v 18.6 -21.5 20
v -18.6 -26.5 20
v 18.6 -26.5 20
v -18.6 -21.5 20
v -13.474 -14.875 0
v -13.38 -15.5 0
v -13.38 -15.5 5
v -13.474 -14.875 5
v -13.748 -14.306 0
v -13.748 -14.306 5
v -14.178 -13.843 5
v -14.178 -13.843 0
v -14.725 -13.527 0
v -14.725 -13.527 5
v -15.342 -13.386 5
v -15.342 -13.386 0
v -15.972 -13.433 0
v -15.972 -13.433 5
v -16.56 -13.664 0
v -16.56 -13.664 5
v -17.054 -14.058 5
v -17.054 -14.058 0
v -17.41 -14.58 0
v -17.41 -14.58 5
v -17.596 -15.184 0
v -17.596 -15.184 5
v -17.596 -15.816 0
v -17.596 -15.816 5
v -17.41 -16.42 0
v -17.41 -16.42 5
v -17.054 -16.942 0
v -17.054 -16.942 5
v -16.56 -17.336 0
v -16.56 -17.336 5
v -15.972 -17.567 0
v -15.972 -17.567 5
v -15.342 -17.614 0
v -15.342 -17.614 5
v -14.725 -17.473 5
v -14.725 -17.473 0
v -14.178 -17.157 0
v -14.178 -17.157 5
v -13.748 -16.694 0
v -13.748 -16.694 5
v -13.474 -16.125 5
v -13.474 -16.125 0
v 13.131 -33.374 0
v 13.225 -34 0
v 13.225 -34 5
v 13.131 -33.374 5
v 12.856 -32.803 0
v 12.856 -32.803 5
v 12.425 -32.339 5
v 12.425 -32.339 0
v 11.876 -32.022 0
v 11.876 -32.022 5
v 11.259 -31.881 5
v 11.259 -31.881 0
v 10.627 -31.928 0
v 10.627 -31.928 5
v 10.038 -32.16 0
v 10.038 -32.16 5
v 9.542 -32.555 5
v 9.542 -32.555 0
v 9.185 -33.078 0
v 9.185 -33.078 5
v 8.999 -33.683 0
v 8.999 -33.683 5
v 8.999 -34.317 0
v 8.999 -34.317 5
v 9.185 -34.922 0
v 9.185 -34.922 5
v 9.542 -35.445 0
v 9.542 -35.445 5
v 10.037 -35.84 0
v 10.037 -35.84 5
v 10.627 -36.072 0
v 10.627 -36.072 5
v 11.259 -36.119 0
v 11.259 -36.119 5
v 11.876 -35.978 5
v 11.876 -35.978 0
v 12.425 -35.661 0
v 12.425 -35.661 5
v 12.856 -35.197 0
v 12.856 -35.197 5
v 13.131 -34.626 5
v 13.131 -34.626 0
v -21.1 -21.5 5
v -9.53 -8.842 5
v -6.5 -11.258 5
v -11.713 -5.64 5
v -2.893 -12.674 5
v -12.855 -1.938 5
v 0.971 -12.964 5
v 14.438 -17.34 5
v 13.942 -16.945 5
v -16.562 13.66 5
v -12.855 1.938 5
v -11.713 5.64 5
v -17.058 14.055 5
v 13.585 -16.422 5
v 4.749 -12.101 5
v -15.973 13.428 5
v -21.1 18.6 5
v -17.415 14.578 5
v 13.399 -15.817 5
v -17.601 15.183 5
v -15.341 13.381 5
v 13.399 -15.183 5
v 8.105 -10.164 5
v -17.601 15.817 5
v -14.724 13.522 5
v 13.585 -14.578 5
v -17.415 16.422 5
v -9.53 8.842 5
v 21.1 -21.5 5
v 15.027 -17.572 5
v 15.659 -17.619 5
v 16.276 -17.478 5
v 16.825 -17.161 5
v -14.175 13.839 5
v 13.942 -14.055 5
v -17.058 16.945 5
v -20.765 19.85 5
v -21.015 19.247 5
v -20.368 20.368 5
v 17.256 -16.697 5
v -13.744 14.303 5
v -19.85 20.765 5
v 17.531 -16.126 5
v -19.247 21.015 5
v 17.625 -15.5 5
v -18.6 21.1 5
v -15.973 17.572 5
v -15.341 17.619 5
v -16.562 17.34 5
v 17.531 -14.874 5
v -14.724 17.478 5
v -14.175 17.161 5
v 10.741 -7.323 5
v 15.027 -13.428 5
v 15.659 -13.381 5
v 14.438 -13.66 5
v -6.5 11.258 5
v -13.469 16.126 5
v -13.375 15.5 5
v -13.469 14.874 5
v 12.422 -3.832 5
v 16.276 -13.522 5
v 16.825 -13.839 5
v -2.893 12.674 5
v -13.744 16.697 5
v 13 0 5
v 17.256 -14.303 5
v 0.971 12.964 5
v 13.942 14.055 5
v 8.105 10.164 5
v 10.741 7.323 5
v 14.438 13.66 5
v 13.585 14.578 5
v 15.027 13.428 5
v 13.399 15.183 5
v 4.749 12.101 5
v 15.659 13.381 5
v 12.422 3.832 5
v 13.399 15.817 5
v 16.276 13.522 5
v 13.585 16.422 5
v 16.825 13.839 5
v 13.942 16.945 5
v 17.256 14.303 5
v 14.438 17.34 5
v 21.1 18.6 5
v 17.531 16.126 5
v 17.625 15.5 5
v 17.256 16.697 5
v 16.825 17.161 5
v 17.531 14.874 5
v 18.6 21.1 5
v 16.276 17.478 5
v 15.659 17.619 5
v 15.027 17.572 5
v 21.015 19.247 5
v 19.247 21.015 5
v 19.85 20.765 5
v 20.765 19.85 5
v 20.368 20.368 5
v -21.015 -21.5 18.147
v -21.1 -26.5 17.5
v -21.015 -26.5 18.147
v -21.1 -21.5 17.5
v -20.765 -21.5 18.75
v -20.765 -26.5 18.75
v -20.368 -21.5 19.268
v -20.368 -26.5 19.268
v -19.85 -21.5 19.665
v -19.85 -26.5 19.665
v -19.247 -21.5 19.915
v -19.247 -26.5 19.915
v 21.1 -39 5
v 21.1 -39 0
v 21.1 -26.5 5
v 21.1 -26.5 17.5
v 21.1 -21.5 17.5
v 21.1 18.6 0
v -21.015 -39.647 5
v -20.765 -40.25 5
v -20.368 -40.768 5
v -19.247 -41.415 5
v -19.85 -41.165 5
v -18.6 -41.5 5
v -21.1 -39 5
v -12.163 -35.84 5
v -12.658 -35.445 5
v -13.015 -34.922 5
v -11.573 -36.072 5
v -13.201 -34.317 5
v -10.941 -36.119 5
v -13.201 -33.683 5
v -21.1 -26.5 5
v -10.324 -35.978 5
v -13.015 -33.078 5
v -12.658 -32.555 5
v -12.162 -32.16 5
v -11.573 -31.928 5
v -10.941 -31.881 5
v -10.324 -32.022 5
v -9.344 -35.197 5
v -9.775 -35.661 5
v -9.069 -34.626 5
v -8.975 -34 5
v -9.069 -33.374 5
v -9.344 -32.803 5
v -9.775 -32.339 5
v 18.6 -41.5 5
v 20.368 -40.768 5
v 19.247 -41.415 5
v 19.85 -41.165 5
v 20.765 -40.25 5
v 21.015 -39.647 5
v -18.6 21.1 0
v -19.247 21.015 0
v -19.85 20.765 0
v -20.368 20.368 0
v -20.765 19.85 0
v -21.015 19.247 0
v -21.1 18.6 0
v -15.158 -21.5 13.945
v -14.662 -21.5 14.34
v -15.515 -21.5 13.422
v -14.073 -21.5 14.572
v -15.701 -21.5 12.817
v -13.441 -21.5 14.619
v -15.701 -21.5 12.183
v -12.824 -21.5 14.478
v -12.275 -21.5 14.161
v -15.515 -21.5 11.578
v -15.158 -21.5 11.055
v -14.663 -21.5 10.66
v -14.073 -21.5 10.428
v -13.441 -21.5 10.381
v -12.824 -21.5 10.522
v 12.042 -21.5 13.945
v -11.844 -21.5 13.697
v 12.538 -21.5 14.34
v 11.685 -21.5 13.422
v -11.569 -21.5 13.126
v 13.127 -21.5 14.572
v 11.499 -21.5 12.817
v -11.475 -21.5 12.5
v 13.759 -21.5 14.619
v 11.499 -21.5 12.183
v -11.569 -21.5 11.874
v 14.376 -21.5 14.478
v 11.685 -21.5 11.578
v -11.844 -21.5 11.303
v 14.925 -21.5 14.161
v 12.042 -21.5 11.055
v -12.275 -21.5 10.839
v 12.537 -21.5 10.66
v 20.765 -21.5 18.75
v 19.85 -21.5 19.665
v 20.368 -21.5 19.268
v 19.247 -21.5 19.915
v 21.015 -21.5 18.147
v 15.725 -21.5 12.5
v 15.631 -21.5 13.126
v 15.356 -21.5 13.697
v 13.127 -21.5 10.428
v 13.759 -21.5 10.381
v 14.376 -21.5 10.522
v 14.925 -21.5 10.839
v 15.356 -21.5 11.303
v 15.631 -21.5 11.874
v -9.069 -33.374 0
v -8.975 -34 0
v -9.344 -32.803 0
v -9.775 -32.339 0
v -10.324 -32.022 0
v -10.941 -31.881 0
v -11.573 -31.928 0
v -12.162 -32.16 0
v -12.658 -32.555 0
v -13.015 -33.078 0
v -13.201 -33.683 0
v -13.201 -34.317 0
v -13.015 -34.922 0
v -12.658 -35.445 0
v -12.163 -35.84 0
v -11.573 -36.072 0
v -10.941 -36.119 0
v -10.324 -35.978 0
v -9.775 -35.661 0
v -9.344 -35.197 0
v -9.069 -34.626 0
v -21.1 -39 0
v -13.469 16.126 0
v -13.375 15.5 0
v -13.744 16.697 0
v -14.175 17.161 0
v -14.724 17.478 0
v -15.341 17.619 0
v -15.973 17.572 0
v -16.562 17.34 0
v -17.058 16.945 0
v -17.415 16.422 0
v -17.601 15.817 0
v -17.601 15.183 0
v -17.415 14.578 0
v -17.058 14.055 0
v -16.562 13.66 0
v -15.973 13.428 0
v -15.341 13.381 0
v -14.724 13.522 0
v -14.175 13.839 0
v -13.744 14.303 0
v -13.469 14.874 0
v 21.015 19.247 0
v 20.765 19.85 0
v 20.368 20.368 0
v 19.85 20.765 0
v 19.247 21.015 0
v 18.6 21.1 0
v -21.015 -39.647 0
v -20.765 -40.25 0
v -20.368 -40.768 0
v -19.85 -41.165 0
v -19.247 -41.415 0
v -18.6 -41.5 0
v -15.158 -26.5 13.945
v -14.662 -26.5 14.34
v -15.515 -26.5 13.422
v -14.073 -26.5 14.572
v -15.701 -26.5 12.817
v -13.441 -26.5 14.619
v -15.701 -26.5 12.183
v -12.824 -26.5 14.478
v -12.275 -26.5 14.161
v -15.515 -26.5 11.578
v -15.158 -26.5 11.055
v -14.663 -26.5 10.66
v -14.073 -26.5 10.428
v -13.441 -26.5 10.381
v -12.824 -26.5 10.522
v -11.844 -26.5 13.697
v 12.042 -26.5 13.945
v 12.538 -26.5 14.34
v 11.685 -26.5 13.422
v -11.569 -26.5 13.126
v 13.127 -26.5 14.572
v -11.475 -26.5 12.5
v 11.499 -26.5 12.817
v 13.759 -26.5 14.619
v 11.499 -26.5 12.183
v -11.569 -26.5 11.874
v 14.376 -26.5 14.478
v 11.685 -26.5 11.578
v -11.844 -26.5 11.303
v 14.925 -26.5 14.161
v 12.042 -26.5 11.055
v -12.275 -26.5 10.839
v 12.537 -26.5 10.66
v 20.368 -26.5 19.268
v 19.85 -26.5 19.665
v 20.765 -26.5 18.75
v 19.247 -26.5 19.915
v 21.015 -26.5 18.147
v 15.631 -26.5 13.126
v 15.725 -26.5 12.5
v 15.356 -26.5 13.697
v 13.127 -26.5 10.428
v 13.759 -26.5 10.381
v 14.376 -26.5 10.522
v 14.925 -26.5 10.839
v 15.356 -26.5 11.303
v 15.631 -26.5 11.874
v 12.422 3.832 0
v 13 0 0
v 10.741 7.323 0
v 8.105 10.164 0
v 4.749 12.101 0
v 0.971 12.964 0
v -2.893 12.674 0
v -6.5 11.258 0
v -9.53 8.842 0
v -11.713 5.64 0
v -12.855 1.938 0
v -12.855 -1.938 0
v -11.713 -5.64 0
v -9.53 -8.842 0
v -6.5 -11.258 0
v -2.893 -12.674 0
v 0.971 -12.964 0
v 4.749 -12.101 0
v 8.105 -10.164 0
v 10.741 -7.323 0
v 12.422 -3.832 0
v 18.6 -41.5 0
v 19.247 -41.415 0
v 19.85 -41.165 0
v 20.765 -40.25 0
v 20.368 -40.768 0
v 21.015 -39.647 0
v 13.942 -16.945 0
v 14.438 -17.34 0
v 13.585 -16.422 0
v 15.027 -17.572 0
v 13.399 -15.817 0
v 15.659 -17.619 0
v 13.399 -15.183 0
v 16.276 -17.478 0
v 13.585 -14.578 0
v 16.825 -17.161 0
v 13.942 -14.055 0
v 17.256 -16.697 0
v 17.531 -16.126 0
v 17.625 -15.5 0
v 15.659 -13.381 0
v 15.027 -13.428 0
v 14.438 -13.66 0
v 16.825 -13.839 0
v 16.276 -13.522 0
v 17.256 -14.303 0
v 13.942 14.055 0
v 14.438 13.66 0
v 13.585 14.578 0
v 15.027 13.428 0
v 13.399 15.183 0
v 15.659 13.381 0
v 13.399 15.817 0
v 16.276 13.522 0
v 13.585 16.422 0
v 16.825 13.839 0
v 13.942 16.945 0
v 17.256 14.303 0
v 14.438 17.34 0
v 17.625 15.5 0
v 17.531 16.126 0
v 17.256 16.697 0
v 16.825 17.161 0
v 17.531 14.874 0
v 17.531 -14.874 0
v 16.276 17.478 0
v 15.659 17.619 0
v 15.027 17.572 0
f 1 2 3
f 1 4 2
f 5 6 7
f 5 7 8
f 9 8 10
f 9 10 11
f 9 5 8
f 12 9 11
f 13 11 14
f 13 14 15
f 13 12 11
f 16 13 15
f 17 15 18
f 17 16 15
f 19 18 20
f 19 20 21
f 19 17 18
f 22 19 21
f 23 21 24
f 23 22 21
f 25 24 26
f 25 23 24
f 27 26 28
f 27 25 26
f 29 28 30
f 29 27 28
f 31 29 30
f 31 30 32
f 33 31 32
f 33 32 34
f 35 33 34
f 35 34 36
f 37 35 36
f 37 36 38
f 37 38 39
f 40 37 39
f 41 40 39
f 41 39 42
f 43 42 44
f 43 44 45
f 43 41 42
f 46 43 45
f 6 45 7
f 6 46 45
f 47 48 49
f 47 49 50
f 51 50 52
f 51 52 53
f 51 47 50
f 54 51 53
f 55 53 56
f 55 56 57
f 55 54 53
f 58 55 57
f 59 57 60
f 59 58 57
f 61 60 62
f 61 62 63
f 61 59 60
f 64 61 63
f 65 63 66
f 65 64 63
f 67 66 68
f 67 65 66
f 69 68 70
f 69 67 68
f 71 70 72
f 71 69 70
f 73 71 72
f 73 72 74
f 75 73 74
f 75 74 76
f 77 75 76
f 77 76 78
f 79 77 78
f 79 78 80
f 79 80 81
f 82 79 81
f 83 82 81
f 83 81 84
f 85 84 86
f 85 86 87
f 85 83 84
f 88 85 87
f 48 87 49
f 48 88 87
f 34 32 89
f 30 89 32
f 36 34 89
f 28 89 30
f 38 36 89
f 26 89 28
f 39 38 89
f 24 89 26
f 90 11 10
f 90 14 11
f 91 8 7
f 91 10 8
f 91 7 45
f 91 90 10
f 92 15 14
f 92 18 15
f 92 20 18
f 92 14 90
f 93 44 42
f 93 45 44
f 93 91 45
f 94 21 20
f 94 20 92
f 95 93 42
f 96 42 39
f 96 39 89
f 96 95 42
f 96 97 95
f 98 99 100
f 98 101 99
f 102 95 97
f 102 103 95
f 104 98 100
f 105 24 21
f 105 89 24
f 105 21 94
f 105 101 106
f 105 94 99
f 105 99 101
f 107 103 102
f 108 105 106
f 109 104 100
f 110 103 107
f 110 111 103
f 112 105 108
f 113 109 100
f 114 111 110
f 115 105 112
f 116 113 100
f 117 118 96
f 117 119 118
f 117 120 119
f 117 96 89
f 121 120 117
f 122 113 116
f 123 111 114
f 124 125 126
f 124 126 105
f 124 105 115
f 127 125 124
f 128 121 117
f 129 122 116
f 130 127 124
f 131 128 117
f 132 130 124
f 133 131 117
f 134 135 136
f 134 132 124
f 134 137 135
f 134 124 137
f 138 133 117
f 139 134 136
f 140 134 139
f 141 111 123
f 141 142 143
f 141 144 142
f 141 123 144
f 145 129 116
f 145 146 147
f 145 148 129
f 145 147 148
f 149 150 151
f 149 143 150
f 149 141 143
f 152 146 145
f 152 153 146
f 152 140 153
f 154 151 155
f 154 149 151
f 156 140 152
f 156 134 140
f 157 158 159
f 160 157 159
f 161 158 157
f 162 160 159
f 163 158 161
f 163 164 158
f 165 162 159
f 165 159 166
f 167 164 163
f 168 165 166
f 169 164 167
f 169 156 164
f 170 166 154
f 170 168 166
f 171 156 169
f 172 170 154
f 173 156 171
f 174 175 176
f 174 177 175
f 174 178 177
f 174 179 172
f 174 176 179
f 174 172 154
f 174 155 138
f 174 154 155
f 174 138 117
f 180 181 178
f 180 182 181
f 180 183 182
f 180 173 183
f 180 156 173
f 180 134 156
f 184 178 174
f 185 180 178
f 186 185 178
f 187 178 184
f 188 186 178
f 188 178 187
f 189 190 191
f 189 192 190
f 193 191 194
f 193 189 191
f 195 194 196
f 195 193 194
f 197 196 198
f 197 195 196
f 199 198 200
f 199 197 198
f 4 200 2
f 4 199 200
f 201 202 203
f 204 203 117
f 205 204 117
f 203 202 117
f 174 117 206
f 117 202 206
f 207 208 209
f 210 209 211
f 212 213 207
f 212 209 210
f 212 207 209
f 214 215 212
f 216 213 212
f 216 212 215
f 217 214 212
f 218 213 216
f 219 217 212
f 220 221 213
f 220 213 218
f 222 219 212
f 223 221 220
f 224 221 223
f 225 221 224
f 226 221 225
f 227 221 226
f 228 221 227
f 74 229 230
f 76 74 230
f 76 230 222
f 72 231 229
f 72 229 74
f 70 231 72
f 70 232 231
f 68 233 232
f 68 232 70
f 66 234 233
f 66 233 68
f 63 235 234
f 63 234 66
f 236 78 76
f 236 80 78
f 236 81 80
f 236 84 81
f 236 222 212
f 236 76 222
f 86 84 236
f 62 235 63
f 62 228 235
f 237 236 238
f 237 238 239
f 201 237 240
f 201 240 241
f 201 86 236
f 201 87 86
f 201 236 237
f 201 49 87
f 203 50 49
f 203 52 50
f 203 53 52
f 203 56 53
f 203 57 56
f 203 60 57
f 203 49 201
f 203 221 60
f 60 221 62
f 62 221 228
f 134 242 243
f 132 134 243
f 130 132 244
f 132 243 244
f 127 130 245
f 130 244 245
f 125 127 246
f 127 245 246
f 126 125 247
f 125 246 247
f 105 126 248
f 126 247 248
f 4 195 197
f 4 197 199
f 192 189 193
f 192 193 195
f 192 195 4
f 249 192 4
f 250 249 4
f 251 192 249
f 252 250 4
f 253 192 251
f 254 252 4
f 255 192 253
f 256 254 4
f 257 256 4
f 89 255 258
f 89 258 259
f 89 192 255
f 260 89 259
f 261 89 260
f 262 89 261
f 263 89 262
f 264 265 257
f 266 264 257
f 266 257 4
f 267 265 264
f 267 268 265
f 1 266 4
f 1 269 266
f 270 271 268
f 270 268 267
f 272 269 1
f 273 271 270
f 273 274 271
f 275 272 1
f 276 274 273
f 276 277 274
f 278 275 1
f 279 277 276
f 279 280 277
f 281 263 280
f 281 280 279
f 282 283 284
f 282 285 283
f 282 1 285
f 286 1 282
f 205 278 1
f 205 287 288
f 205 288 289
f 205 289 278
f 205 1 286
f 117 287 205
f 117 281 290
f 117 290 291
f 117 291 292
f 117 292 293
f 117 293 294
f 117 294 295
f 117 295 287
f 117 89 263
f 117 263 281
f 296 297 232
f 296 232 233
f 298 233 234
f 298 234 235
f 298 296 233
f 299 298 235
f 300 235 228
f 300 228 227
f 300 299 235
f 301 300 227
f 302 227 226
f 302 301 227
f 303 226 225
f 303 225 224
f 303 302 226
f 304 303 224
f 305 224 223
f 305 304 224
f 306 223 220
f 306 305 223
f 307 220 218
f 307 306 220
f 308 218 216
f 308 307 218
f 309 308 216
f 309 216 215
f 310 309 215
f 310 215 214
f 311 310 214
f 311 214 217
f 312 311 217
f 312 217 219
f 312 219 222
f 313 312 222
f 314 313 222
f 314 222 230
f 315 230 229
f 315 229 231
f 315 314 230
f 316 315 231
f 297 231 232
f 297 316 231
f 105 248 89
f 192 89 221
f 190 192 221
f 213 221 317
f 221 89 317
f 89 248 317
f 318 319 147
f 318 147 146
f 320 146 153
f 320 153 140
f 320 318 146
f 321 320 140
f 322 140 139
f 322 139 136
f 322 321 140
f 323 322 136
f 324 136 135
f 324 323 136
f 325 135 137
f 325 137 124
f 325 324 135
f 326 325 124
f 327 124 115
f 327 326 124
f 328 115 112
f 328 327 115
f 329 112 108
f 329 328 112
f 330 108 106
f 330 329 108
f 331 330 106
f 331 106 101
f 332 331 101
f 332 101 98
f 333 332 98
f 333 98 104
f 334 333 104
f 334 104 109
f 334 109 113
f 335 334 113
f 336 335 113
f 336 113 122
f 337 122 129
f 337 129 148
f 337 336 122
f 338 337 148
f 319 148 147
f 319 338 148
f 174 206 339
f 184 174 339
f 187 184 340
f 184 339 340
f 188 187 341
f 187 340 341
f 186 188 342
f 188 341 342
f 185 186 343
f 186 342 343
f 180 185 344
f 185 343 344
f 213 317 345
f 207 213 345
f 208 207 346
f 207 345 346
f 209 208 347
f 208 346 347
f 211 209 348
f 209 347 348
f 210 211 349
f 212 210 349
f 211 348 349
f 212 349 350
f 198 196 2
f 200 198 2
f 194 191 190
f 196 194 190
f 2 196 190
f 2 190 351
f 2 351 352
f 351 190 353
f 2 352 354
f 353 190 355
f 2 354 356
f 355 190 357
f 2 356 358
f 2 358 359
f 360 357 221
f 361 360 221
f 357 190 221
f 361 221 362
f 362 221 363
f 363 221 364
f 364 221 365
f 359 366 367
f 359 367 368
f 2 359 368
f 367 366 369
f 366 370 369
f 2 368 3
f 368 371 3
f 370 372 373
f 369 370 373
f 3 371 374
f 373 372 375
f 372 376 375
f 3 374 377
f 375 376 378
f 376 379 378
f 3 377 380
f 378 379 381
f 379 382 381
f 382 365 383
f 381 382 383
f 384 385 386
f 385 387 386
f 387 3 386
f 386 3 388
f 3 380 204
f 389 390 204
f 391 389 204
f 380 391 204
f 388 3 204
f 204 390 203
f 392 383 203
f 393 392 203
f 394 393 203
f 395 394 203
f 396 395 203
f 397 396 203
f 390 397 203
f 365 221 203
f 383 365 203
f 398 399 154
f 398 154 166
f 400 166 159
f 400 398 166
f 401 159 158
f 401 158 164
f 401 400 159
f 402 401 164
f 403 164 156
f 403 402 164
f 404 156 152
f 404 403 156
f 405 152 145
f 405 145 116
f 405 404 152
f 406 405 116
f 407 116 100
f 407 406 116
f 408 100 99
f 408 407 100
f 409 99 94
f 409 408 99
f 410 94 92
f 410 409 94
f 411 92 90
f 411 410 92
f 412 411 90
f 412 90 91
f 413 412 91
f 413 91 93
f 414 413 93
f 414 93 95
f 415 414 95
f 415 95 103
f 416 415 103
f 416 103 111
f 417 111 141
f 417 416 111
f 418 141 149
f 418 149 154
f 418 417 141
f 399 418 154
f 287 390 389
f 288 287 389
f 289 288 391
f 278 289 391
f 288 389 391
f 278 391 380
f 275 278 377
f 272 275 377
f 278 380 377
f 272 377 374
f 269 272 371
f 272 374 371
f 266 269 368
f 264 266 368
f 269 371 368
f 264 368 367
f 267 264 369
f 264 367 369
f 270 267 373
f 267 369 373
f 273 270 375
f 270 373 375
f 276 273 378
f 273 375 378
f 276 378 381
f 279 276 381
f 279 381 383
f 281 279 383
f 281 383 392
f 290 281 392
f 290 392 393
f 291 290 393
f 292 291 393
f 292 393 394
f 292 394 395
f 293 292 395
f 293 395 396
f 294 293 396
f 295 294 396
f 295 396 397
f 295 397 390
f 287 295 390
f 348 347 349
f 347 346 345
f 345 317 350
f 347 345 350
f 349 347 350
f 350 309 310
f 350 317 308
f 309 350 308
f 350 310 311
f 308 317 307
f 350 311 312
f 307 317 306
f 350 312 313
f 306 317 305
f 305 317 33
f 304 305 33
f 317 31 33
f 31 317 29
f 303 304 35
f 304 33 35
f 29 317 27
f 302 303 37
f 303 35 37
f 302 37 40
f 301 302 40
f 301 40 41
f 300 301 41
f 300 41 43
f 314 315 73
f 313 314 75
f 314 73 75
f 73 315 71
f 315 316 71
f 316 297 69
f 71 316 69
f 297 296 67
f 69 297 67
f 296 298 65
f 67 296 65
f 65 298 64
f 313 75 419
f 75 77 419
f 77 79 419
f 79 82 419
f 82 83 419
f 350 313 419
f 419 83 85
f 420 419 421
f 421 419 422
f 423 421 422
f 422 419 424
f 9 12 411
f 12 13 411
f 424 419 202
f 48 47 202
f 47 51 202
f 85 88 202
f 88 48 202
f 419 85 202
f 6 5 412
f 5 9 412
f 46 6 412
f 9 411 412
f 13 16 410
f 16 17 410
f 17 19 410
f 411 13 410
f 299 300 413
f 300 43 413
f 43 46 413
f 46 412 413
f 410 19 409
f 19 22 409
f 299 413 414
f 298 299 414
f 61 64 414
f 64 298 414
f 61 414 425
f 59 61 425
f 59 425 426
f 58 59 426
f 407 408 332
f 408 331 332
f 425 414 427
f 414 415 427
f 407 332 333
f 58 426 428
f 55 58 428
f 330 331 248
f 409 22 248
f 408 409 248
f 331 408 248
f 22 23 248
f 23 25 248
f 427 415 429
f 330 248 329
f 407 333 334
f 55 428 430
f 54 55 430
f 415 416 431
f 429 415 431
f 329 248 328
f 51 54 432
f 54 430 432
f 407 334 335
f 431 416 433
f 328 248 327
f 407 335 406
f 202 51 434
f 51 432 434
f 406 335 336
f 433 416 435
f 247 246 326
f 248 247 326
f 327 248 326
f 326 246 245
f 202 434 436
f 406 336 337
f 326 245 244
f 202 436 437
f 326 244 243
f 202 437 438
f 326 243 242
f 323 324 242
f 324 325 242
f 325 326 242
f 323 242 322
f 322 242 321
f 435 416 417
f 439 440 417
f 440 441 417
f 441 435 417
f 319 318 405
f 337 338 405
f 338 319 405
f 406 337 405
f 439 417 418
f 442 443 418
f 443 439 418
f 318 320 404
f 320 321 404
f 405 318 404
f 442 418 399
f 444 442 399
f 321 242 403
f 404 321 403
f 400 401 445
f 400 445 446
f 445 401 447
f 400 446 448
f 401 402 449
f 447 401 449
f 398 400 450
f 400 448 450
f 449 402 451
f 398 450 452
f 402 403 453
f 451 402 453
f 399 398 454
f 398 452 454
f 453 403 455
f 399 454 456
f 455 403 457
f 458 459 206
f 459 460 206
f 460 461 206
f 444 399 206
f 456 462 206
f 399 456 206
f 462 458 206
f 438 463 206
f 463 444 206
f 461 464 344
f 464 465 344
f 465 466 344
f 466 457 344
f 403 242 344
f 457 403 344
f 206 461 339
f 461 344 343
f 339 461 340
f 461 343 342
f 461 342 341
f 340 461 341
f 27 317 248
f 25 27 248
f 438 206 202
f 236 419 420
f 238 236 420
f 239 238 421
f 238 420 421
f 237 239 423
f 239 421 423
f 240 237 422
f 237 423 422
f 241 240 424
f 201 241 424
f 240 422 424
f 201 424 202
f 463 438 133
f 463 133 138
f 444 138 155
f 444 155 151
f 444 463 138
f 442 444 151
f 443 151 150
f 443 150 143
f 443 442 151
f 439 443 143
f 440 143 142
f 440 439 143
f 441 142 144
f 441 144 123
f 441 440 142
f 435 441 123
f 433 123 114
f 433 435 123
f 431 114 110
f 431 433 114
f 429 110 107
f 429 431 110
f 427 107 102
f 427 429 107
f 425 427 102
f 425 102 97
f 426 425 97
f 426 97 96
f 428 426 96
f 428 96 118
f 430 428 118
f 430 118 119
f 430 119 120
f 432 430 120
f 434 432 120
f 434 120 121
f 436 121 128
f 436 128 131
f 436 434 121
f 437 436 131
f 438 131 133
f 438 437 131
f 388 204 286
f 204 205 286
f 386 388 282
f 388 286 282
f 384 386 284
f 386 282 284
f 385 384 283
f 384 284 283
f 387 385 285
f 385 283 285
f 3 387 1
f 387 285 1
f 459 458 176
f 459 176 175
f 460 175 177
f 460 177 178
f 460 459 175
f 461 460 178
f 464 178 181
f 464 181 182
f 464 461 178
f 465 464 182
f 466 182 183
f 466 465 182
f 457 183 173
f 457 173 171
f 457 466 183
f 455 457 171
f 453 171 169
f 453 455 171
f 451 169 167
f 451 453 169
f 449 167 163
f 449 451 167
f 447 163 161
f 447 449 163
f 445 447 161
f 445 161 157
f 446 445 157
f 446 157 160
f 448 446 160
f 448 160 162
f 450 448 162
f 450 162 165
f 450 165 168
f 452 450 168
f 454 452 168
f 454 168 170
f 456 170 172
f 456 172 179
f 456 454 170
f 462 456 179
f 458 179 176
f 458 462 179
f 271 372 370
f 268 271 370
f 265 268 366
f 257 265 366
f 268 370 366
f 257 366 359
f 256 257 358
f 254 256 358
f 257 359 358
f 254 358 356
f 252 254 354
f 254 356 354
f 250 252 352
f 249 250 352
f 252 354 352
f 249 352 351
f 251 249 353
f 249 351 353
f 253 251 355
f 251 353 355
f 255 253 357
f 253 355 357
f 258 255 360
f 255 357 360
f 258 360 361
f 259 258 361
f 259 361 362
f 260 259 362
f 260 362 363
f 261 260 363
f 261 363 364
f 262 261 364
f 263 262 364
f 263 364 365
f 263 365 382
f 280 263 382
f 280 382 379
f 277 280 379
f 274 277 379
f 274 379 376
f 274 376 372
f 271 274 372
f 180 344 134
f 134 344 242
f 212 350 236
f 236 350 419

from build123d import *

# Parameters (mm, degrees)
F0_R     = 2.125
F0_R_2   = 2.12
F0_R_3   = 13
F1_DEPTH = 5
F2_W     = 42.2
F2_H     = 5
F3_DEPTH = 15
F4_R     = 2.125
F5_DEPTH = 47.601
F6_R     = 2.5


with BuildPart() as f1:
    # F0 (on Top) → F1 (new body)
    with BuildSketch(Plane.XY):
        with BuildLine():
            Line((18.6, 21.1), (0, 21.1))
            Line((0, 21.1), (-18.6, 21.1))
            ThreePointArc((-18.6, 21.1), (-20.367767, 20.367767), (-21.1, 18.6))
            Line((-21.1, 18.6), (-21.1, -39))
            ThreePointArc((-21.1, -39), (-20.367767, -40.767767), (-18.6, -41.5))
            Line((-18.6, -41.5), (0, -41.5))
            Line((0, -41.5), (18.6, -41.5))
            ThreePointArc((18.6, -41.5), (20.367767, -40.767767), (21.1, -39))
            Line((21.1, -39), (21.1, 18.6))
            ThreePointArc((21.1, 18.6), (20.367767, 20.367767), (18.6, 21.1))
        make_face()
        with Locations((-11.1, -34)):
            Circle(F0_R, mode=Mode.SUBTRACT)
        with Locations((-15.5, -15.5)):
            Circle(F0_R_2, mode=Mode.SUBTRACT)
        with Locations((11.1, -34)):
            Circle(F0_R, mode=Mode.SUBTRACT)
        with Locations((15.5, -15.5)):
            Circle(F0_R, mode=Mode.SUBTRACT)
        with Locations((-15.5, 15.5)):
            Circle(F0_R, mode=Mode.SUBTRACT)
        Circle(F0_R_3, mode=Mode.SUBTRACT)
        with Locations((15.5, 15.5)):
            Circle(F0_R, mode=Mode.SUBTRACT)
    extrude(amount=F1_DEPTH)

    # F2 (on face) → F3 (join)
    with BuildSketch(Plane.XY.offset(5)):
        with Locations((0, -24)):
            Rectangle(F2_W, F2_H)
    extrude(amount=F3_DEPTH)

    # F4 (on face) → F5 (cut, through all)
    with BuildSketch(Plane.XZ.offset(26.5)):
        with Locations((-13.6, 12.5)):
            Circle(F4_R)
        with Locations((13.6, 12.5)):
            Circle(F4_R)
    extrude(amount=-F5_DEPTH, mode=Mode.SUBTRACT)

    # F6
    f6_edges = [f1.edges().sort_by_distance(p)[0] for p in [
        (-21.1, -24, 20),
        (21.1, -24, 20),
    ]]
    fillet(f6_edges, radius=F6_R)


solid = f1.part
